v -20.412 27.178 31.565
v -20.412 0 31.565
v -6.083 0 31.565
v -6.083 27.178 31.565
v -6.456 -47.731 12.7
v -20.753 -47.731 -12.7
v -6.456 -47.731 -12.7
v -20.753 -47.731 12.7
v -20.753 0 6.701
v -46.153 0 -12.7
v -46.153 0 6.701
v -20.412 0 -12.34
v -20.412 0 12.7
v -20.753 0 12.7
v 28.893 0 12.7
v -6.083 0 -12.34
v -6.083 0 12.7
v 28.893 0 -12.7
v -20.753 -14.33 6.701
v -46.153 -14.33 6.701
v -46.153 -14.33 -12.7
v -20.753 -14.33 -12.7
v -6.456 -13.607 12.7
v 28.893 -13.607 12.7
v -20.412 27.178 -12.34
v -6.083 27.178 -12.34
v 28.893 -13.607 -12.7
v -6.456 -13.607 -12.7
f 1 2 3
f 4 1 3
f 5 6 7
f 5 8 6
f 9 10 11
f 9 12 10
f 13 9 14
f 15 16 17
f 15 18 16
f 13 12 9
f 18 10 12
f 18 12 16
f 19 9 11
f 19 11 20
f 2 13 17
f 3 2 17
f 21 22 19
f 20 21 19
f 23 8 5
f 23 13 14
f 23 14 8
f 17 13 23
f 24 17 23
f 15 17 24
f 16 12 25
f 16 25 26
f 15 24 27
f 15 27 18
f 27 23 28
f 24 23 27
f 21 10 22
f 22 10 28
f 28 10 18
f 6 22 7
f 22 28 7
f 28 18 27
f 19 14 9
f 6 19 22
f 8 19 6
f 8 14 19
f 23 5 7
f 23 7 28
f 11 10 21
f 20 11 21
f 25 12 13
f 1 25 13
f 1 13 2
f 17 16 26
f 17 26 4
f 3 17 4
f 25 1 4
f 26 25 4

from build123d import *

# Parameters (mm, degrees)
F0_W     = 14.2970732413
F0_H     = 34.1241974384
F0_H_2   = 13.6066358536
F0_W_2   = 35.348333884
F1_DEPTH = 12.7
F2_W     = 14.3289165571
F2_H     = 43.9045364037
F3_DEPTH = 27.178
F4_W     = 14.3301561475
F4_H     = 19.4006666213
F5_DEPTH = 25.4


with BuildPart() as f1:
    # F0 (on Top) → F1 (new body, symmetric)
    with BuildSketch(Plane.XY):
        with Locations((-13.6043701787, -30.6687345728)):
            Rectangle(F0_W, F0_H)
        with Locations((-13.6043701787, -6.8033179268)):
            Rectangle(F0_W, F0_H_2)
        with Locations((11.218333384, -6.8033179268)):
            Rectangle(F0_W_2, F0_H_2)
    extrude(amount=F1_DEPTH, both=True)

    # F2 (on Front) → F3 (join)
    with BuildSketch(Plane.XZ):
        with Locations((-13.2477167062, 9.6126752906)):
            Rectangle(F2_W, F2_H)
    extrude(amount=-F3_DEPTH)

    # F4 (on face) → F5 (join)
    with BuildSketch(Plane(origin=(-20.7529067993, 0, 0), x_dir=(0, -1, 0), z_dir=(-1, 0, 0))):
        with Locations((7.1650780737, -2.9996666893)):
            Rectangle(F4_W, F4_H)
    extrude(amount=F5_DEPTH)


solid = f1.part
